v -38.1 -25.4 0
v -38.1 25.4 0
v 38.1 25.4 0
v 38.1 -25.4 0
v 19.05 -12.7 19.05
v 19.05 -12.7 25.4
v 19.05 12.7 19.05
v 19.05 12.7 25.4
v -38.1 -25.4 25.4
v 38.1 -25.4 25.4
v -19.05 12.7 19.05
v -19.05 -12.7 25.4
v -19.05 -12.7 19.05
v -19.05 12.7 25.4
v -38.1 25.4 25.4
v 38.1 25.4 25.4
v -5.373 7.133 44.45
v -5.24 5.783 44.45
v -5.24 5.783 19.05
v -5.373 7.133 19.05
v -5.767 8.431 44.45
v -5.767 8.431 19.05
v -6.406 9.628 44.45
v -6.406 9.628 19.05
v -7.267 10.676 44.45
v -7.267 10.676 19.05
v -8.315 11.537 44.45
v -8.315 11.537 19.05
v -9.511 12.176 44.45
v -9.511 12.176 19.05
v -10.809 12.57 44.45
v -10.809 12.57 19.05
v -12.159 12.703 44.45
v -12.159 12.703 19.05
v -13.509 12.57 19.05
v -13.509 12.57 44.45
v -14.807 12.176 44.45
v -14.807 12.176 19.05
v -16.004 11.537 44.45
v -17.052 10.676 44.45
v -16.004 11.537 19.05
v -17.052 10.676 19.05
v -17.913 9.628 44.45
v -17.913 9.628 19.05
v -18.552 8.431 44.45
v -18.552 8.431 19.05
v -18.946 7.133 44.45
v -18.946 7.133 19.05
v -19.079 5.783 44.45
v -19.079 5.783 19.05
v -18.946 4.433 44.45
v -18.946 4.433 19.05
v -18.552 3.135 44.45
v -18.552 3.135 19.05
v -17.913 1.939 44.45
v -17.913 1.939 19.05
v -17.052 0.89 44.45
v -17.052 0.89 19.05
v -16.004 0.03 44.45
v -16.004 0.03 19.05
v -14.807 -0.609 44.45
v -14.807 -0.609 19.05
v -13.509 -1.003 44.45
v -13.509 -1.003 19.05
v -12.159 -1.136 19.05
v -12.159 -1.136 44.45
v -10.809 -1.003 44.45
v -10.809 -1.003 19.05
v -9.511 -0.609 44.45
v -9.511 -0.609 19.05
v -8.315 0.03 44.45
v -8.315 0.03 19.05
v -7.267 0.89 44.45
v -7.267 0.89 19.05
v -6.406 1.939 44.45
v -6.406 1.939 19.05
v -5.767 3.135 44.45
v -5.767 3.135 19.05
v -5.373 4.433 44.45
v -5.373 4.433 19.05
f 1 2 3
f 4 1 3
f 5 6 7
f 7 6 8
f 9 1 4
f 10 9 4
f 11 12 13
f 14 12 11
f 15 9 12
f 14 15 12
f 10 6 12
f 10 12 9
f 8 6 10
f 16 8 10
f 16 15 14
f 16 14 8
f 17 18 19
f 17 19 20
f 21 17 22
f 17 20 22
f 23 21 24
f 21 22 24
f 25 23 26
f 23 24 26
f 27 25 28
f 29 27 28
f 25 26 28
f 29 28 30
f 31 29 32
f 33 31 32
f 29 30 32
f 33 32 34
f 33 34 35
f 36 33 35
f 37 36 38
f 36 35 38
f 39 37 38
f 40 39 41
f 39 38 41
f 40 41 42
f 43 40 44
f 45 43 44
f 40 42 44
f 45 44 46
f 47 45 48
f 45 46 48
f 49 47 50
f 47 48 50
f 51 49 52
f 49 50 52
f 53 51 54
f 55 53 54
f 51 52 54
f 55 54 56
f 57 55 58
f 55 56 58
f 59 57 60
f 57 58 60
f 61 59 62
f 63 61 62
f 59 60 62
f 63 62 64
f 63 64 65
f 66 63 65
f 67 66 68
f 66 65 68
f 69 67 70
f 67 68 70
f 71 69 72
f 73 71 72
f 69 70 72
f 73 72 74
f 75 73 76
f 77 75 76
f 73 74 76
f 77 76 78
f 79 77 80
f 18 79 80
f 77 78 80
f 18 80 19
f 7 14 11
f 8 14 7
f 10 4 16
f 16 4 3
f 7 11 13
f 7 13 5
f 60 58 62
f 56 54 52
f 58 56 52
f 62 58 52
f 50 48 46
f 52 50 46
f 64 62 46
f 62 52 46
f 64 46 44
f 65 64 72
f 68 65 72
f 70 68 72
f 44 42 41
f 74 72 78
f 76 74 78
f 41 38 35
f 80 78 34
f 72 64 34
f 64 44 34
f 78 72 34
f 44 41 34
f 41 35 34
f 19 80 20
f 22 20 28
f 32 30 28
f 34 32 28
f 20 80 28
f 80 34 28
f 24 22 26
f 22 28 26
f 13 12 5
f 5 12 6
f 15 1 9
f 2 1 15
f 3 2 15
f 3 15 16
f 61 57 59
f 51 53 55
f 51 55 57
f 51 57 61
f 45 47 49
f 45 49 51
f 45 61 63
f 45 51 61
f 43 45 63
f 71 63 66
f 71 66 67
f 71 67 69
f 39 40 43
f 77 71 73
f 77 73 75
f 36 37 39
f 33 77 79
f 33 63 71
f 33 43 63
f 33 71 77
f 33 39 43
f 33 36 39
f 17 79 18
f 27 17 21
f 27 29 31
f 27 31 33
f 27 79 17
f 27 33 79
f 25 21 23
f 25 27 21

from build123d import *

# Parameters (mm, degrees)
F0_W     = 76.2
F0_H     = 50.8
F1_DEPTH = 25.4
F2_W     = 38.1
F2_H     = 25.4
F3_DEPTH = 6.35
F4_R     = 6.919484
F5_DEPTH = 25.4


with BuildPart() as f1:
    # F0 (on Top) → F1 (new body)
    with BuildSketch(Plane.XY):
        Rectangle(F0_W, F0_H)
    extrude(amount=F1_DEPTH)

    # F2 (on face) → F3 (cut)
    with BuildSketch(Plane.XY.offset(25.4)):
        Rectangle(F2_W, F2_H)
    extrude(amount=-F3_DEPTH, mode=Mode.SUBTRACT)


with BuildPart() as f5:
    # F4 (on face) → F5 (new body)
    with BuildSketch(Plane.XY.offset(19.05)):
        with Locations((-12.159365, 5.783275)):
            Circle(F4_R)
    extrude(amount=F5_DEPTH)


solid = Compound([f1.part, f5.part])
